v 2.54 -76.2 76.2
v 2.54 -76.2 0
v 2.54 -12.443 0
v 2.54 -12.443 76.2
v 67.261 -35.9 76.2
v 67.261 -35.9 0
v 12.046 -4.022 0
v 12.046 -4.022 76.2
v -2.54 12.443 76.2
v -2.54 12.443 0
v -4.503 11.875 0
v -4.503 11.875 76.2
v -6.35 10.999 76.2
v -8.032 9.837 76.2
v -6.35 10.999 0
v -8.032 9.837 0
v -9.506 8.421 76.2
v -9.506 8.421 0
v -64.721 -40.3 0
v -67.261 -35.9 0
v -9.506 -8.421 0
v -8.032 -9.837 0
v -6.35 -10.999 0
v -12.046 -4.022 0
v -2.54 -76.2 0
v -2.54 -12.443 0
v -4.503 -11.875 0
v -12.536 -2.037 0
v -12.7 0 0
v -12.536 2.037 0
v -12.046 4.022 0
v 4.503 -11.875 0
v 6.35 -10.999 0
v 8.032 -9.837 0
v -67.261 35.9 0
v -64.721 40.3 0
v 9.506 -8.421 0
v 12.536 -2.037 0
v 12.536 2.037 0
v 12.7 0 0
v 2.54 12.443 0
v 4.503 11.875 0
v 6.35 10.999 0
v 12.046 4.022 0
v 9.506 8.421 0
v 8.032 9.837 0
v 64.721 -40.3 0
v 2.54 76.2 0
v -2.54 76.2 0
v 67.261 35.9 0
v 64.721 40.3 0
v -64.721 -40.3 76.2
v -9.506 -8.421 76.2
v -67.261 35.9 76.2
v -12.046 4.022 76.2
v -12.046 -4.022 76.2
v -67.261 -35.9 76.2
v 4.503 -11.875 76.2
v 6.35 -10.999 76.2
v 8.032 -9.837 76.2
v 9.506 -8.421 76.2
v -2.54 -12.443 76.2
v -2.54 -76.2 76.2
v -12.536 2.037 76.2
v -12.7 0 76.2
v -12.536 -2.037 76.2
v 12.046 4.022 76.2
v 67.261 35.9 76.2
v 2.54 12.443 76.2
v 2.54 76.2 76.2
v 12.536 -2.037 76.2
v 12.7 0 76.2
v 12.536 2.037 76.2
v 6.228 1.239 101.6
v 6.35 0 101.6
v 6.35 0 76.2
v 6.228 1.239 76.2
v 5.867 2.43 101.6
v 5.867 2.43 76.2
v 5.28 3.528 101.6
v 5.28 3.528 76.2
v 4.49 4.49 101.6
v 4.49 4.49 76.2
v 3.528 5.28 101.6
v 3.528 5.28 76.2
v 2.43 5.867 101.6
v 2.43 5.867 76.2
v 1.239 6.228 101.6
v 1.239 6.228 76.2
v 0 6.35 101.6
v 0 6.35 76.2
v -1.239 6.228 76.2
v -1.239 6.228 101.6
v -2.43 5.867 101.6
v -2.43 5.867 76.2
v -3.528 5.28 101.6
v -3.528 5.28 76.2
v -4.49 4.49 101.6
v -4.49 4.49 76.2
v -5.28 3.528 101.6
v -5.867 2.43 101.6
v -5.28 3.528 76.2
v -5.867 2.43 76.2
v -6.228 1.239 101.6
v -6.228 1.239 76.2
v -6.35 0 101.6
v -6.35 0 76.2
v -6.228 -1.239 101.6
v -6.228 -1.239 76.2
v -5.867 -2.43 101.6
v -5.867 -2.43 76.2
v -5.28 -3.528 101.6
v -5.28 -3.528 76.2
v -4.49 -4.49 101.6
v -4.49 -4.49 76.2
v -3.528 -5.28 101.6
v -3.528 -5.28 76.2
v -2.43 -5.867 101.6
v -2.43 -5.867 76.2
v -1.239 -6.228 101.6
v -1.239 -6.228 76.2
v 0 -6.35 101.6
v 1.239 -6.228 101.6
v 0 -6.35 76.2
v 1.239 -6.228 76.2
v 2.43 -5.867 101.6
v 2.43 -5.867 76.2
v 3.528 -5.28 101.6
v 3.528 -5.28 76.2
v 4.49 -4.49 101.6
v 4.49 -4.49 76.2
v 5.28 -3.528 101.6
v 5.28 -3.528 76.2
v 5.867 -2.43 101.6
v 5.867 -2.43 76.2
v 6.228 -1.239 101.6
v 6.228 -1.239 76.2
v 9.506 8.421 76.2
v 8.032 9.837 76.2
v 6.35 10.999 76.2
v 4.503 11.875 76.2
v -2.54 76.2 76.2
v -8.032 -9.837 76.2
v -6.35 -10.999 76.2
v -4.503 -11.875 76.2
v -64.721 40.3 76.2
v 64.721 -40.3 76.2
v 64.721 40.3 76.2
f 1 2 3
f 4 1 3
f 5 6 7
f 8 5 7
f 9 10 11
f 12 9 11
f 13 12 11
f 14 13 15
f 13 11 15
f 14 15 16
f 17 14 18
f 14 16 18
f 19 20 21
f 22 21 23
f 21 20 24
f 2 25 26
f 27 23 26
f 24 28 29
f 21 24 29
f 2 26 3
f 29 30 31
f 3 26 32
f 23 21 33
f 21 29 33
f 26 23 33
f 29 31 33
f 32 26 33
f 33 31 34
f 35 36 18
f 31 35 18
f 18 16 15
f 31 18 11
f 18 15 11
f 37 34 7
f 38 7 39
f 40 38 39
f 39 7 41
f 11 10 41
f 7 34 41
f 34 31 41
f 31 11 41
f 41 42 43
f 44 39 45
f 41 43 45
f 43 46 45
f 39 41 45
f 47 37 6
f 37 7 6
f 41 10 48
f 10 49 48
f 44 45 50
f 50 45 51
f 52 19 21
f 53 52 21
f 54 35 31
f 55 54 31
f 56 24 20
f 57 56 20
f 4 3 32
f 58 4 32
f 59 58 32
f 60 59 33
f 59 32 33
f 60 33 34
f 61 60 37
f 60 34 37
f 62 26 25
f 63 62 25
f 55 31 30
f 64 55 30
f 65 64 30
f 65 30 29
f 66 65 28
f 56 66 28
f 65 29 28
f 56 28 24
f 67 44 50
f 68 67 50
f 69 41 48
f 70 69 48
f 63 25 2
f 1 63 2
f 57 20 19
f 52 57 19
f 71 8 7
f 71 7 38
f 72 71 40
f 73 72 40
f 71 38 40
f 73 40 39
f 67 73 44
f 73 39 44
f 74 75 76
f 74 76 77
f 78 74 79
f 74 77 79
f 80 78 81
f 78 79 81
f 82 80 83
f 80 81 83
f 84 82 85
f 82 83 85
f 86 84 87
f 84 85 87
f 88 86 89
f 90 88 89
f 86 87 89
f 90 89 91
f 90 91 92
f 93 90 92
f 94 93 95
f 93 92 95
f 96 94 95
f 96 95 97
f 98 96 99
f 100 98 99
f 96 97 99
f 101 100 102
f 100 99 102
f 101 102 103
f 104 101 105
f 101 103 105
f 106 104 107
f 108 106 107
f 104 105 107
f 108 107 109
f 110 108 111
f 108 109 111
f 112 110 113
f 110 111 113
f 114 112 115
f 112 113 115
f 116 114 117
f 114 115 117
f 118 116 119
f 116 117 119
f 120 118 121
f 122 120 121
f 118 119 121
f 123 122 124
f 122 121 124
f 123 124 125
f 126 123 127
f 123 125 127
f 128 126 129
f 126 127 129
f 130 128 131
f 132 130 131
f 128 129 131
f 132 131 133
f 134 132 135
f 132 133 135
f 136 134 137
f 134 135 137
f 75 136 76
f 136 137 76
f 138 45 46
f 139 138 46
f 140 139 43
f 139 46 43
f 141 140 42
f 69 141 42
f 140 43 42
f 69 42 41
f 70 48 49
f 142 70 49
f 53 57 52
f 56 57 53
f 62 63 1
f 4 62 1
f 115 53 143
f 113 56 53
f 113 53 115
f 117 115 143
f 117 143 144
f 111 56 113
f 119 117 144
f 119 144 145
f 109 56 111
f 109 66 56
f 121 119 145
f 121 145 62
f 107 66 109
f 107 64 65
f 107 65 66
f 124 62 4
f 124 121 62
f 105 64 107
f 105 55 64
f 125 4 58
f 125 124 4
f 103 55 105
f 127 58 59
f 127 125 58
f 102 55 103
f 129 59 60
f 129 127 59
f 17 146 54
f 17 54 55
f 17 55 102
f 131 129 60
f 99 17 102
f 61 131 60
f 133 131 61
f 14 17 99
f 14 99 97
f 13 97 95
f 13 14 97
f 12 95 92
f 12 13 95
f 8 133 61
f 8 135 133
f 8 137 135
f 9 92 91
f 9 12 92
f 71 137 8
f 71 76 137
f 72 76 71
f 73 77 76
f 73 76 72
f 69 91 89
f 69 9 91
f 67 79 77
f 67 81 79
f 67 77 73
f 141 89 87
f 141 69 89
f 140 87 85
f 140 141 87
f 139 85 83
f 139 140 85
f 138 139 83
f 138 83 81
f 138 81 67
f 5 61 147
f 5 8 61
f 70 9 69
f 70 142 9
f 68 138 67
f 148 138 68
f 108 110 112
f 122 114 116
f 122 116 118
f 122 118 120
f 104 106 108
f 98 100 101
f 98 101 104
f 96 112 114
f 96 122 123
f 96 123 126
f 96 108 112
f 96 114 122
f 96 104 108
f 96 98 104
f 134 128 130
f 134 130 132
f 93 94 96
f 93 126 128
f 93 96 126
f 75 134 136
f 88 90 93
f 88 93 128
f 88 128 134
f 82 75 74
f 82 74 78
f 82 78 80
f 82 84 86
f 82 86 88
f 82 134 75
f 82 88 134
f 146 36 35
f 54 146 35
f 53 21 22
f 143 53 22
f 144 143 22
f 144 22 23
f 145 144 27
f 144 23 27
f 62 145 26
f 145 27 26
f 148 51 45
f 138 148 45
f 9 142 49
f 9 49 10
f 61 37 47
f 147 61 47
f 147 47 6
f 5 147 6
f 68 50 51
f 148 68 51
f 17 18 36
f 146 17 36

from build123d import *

# Parameters (mm, degrees)
SKETCH1_R           = 12.7
BOSS_EXTRUDE1_DEPTH = 76.2
SKETCH2_R           = 6.35
BOSS_EXTRUDE2_DEPTH = 25.4


with BuildPart() as part:
    # Sketch1 → Boss-Extrude1 (new body)
    with BuildSketch(Plane.XY):
        Circle(SKETCH1_R)
        Polygon((2.54, 0), (2.54, 76.2), (-2.54, 76.2), (-2.54, 0), (-2.54, -76.2), (2.54, -76.2), align=None)
        Polygon((1.27, -2.199704526), (67.261135768, 35.900295474), (64.721135768, 40.299704526), (-1.27, 2.199704526), (-67.261135768, -35.900295474), (-64.721135768, -40.299704526), align=None)
        Polygon((-1.27, -2.199704526), (64.721135768, -40.299704526), (67.261135768, -35.900295474), (1.27, 2.199704526), (-64.721135768, 40.299704526), (-67.261135768, 35.900295474), align=None)
    extrude(amount=BOSS_EXTRUDE1_DEPTH)

    # Sketch2 → Boss-Extrude2 (add)
    with BuildSketch(Plane.XY.offset(76.2)):
        Circle(SKETCH2_R)
    extrude(amount=BOSS_EXTRUDE2_DEPTH)


solid = part.part
